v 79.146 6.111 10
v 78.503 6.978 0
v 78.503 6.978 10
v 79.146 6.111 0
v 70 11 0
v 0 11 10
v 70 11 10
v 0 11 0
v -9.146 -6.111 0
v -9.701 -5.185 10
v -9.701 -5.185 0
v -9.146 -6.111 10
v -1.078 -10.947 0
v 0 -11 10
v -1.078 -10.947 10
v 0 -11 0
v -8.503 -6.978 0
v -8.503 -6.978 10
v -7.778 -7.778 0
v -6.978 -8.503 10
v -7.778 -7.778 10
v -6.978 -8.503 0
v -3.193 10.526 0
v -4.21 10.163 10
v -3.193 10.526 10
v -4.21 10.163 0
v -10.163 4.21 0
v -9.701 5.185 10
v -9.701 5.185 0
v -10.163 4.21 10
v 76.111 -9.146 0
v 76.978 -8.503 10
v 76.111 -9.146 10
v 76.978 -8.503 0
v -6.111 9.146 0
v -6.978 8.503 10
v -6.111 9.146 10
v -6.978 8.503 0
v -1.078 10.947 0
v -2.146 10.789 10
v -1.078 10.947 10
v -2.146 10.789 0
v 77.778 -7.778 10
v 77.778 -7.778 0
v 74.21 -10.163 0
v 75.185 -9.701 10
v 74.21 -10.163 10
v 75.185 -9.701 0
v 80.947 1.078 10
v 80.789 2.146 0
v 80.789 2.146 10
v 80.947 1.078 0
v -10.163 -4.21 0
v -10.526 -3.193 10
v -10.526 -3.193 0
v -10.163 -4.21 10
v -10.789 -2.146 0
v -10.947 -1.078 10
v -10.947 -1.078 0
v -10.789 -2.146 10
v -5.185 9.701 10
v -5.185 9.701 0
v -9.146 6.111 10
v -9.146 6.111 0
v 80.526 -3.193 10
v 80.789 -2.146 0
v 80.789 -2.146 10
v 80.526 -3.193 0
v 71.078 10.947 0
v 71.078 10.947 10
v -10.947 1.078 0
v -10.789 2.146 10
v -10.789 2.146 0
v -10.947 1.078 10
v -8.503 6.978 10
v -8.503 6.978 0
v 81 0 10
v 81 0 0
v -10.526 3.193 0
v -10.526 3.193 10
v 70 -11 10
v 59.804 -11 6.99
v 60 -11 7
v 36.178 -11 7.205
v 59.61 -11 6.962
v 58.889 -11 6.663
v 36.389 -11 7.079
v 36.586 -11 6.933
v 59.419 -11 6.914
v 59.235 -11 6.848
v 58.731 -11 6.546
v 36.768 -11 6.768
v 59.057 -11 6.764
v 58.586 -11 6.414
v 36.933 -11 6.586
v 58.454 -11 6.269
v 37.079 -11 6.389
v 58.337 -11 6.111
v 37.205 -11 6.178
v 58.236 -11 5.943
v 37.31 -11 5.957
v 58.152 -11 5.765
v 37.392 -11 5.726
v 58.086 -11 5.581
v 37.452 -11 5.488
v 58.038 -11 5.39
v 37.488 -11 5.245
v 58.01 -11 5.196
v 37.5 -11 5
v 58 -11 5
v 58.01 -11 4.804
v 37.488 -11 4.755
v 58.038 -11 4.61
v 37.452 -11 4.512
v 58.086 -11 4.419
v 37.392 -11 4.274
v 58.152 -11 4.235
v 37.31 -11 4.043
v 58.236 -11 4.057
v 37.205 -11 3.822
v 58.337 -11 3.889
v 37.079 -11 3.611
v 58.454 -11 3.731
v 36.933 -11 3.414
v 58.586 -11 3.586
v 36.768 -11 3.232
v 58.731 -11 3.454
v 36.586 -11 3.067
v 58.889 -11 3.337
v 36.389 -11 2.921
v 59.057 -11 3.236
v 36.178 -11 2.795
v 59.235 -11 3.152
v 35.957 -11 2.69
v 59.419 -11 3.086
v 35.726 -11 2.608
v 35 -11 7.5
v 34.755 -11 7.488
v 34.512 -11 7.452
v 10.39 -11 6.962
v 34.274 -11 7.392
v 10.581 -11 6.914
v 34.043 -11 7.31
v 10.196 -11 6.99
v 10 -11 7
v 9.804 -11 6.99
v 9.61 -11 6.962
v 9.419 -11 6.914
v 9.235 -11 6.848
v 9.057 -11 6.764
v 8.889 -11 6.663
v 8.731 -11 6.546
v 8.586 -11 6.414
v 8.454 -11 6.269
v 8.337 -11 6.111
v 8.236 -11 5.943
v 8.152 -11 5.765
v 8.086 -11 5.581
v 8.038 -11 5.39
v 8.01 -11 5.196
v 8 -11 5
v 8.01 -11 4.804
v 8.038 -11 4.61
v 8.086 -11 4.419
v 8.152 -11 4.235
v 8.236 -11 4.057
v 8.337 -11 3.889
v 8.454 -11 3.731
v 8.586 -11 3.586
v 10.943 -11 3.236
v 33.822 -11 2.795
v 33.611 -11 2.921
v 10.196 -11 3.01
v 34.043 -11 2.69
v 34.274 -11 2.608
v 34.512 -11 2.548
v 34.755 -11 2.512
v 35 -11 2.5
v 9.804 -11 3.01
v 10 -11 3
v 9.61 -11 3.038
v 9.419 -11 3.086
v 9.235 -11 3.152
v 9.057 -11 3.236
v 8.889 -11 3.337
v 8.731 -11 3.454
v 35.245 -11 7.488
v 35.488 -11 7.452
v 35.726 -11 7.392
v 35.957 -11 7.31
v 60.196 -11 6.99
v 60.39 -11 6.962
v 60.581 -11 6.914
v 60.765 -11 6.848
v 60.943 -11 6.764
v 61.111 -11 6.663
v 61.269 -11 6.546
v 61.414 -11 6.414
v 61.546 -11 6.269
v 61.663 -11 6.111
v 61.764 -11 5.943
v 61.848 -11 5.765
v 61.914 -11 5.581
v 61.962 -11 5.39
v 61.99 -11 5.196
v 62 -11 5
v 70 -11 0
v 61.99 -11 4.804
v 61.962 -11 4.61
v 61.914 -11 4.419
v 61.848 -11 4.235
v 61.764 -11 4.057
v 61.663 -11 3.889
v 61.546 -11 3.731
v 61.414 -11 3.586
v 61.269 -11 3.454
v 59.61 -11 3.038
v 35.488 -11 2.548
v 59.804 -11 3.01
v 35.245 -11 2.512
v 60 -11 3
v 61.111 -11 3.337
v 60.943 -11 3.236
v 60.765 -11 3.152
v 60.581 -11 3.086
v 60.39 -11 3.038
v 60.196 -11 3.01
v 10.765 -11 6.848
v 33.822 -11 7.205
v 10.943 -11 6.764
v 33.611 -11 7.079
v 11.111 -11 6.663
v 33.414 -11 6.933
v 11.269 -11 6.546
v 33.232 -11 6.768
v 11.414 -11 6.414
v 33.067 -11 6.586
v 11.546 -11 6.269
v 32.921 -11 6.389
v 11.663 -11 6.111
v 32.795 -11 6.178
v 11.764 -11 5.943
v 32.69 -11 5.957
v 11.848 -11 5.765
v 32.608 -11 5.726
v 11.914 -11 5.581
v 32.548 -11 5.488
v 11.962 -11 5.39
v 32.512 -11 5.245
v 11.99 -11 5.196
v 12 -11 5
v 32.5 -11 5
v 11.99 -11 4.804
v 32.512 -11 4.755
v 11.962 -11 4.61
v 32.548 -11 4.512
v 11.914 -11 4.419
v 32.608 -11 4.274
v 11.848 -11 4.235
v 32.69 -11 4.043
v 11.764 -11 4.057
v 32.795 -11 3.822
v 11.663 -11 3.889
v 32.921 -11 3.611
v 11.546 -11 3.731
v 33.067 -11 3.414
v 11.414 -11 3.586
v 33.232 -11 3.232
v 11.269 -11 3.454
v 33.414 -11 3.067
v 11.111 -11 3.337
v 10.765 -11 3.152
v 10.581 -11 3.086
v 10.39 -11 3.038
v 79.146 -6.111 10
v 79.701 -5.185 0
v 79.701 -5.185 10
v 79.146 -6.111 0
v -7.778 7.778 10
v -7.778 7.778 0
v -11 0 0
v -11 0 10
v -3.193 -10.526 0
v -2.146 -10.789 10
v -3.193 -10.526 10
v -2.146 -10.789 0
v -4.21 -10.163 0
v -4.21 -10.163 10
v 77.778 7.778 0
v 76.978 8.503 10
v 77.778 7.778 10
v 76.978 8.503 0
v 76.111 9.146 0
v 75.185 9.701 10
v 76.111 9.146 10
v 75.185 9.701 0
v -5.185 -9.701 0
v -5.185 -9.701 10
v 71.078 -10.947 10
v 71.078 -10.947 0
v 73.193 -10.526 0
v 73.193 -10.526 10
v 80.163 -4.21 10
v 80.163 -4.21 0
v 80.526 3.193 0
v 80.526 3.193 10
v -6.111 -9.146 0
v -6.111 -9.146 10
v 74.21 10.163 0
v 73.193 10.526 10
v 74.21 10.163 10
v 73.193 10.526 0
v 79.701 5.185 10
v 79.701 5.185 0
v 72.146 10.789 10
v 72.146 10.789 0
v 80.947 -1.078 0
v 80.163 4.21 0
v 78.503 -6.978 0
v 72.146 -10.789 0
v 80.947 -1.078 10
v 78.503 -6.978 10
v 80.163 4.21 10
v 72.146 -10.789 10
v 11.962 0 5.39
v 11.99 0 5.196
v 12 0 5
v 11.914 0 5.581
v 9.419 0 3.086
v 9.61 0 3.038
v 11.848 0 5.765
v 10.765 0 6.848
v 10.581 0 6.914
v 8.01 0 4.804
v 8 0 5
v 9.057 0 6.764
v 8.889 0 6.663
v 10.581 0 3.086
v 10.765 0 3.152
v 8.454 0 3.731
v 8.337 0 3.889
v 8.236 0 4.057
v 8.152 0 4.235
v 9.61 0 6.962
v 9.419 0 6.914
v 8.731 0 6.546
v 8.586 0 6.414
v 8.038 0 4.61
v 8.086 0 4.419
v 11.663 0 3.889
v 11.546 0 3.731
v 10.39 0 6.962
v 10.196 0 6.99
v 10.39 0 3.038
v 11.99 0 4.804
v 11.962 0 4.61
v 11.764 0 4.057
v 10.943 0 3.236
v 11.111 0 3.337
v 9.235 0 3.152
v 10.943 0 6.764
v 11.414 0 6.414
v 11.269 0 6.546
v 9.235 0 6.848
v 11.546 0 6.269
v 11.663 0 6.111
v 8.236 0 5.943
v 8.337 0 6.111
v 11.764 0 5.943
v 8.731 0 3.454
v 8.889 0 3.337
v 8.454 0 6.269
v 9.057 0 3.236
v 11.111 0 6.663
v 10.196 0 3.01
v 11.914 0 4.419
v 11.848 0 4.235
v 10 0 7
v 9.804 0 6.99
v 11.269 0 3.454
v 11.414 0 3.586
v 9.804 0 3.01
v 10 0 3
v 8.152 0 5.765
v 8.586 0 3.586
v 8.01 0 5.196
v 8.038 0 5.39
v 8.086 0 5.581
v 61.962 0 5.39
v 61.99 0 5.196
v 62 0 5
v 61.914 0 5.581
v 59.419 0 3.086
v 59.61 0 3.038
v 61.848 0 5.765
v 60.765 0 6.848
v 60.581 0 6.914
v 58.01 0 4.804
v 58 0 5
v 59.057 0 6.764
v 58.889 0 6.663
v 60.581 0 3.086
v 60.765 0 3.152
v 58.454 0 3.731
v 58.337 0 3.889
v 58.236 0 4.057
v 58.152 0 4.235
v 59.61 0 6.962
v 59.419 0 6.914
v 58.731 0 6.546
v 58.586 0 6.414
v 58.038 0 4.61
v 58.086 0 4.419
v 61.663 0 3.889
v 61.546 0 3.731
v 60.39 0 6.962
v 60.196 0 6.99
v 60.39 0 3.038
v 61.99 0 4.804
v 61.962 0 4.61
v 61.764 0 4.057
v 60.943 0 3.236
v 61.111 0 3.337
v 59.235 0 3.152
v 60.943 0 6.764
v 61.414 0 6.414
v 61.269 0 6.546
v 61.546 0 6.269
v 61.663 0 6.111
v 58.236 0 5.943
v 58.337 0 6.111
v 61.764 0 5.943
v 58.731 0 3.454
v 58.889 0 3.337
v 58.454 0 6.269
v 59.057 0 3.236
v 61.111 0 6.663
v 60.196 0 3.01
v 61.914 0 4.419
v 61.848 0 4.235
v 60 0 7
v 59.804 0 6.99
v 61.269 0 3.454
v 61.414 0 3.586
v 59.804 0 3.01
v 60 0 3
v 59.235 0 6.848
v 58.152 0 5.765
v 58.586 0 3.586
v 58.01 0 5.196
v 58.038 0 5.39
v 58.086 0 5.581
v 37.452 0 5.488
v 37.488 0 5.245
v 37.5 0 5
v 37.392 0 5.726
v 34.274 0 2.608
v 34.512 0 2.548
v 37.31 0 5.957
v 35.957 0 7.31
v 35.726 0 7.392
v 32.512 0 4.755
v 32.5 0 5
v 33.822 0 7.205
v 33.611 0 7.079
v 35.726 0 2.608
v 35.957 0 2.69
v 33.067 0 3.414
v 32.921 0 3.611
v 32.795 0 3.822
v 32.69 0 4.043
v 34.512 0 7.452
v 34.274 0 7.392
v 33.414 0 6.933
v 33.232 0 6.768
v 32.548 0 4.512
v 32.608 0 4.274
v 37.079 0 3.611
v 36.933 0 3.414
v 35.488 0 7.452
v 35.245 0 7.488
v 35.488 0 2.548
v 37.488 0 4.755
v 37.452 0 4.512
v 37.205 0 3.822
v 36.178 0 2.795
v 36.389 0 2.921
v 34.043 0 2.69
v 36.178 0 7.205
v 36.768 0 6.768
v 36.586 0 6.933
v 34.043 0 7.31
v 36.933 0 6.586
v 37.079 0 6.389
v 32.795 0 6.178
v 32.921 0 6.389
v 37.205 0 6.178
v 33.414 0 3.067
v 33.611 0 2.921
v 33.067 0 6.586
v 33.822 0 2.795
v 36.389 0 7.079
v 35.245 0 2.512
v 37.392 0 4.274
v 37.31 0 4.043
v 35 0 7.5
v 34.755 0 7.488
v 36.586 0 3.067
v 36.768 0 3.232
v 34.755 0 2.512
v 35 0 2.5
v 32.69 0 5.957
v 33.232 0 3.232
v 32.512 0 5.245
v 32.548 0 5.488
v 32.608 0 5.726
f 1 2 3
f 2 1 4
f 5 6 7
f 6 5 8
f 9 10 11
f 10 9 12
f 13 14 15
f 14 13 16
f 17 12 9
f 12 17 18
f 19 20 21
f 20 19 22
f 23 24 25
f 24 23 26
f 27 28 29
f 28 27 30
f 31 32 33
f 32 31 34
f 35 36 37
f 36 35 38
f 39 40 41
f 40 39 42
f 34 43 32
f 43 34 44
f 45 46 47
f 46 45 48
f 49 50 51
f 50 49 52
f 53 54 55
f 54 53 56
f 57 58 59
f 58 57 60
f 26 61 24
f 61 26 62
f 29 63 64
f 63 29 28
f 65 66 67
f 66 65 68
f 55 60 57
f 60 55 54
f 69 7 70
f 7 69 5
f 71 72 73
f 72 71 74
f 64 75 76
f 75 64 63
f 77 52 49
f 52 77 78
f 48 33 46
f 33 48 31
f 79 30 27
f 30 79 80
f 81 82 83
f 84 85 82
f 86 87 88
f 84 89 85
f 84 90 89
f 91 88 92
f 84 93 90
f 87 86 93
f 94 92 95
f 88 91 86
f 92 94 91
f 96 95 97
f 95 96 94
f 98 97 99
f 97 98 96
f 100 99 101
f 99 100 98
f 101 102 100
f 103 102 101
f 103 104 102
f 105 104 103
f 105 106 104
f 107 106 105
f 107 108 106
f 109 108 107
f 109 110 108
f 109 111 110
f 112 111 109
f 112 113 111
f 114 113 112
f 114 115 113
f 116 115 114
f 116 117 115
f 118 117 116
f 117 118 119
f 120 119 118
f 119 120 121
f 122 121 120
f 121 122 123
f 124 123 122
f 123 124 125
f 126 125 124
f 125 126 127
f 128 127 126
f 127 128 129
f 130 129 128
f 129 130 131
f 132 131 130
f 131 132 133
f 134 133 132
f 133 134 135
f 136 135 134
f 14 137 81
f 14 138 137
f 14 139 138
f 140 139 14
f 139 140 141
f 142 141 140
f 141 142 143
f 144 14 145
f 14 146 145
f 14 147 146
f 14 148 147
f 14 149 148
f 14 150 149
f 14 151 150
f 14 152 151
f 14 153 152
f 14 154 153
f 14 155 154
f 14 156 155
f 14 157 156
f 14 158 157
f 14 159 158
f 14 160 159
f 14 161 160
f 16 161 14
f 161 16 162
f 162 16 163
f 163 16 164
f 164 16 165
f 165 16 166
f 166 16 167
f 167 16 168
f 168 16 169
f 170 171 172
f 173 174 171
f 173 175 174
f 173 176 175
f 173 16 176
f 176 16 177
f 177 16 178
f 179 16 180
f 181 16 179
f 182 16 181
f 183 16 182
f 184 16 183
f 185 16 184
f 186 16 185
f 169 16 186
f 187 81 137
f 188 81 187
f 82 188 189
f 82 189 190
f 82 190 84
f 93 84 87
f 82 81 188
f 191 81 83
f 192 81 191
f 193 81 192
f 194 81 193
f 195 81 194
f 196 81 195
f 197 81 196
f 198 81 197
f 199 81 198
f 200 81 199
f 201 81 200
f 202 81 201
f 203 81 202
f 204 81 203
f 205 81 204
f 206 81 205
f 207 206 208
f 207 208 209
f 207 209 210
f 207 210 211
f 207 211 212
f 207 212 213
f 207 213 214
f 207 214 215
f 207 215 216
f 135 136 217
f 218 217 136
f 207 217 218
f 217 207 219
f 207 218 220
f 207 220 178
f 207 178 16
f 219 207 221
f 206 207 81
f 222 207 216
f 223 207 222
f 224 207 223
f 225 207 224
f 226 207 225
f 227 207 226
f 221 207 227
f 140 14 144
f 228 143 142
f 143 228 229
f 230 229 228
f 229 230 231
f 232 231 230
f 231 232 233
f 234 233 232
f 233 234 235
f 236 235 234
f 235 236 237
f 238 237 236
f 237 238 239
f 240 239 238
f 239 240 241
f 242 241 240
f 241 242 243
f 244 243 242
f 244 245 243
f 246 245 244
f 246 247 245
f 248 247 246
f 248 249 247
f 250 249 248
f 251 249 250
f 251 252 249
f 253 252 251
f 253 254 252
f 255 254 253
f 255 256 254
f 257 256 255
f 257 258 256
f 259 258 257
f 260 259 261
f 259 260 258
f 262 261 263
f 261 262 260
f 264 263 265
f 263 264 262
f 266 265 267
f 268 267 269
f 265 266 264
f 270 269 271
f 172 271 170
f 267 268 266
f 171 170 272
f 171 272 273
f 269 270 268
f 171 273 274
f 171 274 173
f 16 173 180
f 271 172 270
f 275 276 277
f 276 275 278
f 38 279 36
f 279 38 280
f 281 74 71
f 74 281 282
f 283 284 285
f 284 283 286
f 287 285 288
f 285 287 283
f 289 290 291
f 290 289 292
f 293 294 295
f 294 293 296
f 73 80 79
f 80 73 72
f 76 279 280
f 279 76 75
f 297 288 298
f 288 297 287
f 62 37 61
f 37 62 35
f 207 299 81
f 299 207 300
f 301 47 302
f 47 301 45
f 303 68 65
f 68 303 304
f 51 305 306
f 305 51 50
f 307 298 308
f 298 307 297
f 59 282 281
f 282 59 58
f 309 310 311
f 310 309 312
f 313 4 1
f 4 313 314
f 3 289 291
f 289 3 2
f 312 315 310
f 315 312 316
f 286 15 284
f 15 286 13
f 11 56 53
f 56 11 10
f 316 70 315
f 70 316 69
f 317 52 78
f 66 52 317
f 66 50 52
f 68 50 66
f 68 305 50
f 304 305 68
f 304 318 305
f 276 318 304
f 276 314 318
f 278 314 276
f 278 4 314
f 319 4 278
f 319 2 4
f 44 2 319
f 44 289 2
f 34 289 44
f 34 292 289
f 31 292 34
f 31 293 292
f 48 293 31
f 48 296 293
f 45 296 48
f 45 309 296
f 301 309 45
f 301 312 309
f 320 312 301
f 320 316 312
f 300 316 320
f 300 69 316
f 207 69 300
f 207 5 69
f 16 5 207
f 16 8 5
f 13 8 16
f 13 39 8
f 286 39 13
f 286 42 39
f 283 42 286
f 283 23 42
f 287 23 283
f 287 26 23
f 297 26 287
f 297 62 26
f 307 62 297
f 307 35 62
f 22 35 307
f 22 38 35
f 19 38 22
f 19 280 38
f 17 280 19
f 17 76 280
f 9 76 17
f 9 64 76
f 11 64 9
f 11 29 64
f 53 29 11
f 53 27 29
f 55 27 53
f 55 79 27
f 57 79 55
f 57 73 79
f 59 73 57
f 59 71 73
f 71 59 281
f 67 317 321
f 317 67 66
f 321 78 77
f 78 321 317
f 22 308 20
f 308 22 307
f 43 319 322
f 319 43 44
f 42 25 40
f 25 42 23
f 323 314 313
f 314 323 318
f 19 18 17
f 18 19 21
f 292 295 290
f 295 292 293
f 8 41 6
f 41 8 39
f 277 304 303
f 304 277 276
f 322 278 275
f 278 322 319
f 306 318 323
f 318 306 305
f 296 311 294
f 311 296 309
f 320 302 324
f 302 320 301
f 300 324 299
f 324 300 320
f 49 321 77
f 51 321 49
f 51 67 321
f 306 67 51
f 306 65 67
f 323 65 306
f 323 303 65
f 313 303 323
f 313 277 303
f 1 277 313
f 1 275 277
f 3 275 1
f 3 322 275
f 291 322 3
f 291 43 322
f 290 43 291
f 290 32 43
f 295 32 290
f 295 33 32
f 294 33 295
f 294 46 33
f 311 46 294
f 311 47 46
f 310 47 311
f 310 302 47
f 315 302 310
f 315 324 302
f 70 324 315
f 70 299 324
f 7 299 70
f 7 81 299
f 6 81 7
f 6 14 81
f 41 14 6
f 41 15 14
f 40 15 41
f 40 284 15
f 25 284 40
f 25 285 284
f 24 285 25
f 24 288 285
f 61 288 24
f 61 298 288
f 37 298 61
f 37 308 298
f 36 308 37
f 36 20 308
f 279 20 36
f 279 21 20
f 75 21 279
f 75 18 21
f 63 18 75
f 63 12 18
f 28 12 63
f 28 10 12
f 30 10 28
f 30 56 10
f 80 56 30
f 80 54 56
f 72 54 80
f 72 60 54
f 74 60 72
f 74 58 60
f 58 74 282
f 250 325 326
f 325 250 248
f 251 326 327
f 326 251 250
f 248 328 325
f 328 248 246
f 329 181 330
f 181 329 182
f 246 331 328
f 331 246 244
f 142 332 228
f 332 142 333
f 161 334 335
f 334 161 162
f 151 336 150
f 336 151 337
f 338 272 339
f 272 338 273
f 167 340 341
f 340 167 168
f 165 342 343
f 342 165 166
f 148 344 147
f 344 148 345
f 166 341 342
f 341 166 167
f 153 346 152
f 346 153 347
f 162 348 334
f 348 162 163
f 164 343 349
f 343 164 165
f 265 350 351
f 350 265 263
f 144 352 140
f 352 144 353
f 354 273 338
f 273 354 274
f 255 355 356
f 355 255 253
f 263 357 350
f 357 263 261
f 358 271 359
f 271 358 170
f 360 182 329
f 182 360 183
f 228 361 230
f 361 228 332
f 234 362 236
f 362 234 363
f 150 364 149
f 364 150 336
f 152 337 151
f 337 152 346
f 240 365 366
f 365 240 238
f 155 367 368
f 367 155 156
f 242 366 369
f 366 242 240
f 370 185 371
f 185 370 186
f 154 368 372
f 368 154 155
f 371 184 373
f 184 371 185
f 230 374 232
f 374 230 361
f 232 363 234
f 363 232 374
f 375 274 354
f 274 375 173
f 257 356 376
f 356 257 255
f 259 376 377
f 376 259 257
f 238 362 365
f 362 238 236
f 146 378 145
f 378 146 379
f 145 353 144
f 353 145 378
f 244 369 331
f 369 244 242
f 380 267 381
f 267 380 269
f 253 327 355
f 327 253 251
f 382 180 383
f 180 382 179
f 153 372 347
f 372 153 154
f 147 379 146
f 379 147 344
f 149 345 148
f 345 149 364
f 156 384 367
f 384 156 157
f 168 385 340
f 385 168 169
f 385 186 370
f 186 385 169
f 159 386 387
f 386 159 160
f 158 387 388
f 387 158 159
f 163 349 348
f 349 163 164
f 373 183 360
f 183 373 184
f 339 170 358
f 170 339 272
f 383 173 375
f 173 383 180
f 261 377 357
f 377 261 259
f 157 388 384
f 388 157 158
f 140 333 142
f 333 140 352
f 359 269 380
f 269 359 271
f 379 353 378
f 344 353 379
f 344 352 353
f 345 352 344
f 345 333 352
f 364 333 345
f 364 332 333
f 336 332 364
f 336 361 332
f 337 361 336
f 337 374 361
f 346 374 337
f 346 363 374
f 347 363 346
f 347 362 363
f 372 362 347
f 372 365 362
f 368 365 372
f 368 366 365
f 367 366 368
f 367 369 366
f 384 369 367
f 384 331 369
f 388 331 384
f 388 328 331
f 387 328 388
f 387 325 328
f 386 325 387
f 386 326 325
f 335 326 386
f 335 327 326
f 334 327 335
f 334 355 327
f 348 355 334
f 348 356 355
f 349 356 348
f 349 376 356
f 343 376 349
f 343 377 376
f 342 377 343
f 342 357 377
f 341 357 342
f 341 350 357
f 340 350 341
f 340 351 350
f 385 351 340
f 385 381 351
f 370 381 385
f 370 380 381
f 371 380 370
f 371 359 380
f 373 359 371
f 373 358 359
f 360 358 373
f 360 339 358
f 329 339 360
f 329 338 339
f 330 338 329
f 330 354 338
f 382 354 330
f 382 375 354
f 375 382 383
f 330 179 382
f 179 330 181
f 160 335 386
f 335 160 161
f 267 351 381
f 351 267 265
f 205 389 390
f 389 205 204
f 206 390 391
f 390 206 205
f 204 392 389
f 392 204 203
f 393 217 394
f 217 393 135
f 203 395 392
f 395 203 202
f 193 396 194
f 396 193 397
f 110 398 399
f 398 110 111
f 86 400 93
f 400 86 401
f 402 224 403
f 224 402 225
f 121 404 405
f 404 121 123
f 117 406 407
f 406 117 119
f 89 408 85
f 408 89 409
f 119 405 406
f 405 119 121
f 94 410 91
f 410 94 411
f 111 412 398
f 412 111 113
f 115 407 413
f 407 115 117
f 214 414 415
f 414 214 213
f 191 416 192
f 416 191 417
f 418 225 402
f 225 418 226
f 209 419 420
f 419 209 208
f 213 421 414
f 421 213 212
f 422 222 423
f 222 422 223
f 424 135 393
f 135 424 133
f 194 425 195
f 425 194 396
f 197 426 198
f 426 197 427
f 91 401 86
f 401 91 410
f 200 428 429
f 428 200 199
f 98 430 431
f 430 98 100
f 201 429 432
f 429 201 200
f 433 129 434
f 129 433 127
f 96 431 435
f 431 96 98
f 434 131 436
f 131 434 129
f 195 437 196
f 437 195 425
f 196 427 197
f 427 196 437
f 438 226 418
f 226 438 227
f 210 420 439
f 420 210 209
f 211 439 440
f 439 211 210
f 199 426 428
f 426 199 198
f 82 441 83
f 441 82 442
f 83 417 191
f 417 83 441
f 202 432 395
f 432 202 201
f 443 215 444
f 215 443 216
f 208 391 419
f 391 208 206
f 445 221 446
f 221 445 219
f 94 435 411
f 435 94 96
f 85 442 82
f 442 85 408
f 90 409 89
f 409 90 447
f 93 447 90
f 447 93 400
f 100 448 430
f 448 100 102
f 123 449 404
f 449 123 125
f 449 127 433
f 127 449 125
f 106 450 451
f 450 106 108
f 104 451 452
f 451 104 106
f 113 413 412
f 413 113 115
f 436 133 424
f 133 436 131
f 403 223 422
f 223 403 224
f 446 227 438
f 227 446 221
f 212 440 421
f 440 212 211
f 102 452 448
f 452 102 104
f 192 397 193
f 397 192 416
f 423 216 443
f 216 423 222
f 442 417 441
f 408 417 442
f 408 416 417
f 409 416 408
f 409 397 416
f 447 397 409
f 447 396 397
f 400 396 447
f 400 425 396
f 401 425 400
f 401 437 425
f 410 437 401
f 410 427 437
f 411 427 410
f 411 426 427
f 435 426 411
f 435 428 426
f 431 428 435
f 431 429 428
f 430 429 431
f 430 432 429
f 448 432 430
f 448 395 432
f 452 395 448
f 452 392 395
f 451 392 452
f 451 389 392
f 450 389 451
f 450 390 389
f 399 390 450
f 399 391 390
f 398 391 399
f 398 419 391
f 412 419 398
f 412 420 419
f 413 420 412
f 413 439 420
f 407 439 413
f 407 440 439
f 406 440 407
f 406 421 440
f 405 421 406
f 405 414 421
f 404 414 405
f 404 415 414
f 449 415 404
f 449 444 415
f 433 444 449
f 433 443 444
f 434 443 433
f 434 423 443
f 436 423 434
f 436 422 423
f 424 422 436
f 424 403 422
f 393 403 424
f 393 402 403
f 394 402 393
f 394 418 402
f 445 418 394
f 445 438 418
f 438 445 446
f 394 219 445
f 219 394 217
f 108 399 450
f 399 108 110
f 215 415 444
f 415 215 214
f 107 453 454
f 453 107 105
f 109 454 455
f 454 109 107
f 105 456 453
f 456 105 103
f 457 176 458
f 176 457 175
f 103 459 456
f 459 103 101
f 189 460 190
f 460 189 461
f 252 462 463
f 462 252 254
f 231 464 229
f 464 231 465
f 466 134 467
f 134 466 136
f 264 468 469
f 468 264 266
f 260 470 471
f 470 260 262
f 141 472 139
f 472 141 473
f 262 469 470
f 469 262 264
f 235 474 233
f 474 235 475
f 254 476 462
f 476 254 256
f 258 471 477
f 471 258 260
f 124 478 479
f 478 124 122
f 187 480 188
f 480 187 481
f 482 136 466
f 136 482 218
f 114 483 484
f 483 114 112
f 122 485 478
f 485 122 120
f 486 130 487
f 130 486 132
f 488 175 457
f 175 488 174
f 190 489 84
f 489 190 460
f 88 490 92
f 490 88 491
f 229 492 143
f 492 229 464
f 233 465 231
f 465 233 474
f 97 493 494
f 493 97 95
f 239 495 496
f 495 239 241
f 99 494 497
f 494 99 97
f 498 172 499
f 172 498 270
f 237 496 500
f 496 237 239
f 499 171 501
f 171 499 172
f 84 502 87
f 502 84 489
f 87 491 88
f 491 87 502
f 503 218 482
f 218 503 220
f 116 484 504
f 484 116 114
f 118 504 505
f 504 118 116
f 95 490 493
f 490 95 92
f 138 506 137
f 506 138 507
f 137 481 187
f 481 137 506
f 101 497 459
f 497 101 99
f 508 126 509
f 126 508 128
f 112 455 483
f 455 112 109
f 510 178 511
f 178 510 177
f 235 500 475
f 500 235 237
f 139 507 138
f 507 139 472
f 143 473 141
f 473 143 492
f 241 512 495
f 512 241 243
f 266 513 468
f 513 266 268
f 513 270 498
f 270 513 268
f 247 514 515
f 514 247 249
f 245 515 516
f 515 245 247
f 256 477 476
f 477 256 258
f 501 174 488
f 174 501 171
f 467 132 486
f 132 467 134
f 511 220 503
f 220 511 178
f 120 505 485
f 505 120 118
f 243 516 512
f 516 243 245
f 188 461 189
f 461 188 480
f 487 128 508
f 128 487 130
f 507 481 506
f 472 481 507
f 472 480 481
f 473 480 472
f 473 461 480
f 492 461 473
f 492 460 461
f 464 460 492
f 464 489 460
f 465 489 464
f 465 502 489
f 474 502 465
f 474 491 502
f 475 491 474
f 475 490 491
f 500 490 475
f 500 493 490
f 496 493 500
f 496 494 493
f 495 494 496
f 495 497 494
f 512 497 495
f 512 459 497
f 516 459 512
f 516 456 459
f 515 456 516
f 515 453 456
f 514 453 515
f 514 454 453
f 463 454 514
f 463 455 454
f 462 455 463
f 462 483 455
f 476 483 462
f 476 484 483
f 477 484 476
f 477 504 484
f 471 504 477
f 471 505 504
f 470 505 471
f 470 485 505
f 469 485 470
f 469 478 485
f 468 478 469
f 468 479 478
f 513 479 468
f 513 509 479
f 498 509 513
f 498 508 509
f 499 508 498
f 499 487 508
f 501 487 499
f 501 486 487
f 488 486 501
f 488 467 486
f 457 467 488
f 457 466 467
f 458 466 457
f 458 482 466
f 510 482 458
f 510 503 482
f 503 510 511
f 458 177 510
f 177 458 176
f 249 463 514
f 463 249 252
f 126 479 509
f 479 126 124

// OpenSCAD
// Generic antenna feed point insulator
// All dimensions in mm. Designed for printers up to 200x200x200.

$fn = 64;

module feed_point_insulator(body_len=70, body_w=22, body_h=10,
                            tie_d=4, feed_d=5, edge=10) {
    difference() {
        hull() {
            translate([0, 0, 0]) cylinder(h=body_h, r=body_w/2);
            translate([body_len, 0, 0]) cylinder(h=body_h, r=body_w/2);
        }
        translate([edge, 0, body_h/2]) rotate([90, 0, 0]) cylinder(h=body_w+2, r=tie_d/2);
        translate([body_len - edge, 0, body_h/2]) rotate([90, 0, 0]) cylinder(h=body_w+2, r=tie_d/2);
        translate([body_len/2, 0, body_h/2]) rotate([90, 0, 0]) cylinder(h=body_w+2, r=feed_d/2);
    }
}

feed_point_insulator();
